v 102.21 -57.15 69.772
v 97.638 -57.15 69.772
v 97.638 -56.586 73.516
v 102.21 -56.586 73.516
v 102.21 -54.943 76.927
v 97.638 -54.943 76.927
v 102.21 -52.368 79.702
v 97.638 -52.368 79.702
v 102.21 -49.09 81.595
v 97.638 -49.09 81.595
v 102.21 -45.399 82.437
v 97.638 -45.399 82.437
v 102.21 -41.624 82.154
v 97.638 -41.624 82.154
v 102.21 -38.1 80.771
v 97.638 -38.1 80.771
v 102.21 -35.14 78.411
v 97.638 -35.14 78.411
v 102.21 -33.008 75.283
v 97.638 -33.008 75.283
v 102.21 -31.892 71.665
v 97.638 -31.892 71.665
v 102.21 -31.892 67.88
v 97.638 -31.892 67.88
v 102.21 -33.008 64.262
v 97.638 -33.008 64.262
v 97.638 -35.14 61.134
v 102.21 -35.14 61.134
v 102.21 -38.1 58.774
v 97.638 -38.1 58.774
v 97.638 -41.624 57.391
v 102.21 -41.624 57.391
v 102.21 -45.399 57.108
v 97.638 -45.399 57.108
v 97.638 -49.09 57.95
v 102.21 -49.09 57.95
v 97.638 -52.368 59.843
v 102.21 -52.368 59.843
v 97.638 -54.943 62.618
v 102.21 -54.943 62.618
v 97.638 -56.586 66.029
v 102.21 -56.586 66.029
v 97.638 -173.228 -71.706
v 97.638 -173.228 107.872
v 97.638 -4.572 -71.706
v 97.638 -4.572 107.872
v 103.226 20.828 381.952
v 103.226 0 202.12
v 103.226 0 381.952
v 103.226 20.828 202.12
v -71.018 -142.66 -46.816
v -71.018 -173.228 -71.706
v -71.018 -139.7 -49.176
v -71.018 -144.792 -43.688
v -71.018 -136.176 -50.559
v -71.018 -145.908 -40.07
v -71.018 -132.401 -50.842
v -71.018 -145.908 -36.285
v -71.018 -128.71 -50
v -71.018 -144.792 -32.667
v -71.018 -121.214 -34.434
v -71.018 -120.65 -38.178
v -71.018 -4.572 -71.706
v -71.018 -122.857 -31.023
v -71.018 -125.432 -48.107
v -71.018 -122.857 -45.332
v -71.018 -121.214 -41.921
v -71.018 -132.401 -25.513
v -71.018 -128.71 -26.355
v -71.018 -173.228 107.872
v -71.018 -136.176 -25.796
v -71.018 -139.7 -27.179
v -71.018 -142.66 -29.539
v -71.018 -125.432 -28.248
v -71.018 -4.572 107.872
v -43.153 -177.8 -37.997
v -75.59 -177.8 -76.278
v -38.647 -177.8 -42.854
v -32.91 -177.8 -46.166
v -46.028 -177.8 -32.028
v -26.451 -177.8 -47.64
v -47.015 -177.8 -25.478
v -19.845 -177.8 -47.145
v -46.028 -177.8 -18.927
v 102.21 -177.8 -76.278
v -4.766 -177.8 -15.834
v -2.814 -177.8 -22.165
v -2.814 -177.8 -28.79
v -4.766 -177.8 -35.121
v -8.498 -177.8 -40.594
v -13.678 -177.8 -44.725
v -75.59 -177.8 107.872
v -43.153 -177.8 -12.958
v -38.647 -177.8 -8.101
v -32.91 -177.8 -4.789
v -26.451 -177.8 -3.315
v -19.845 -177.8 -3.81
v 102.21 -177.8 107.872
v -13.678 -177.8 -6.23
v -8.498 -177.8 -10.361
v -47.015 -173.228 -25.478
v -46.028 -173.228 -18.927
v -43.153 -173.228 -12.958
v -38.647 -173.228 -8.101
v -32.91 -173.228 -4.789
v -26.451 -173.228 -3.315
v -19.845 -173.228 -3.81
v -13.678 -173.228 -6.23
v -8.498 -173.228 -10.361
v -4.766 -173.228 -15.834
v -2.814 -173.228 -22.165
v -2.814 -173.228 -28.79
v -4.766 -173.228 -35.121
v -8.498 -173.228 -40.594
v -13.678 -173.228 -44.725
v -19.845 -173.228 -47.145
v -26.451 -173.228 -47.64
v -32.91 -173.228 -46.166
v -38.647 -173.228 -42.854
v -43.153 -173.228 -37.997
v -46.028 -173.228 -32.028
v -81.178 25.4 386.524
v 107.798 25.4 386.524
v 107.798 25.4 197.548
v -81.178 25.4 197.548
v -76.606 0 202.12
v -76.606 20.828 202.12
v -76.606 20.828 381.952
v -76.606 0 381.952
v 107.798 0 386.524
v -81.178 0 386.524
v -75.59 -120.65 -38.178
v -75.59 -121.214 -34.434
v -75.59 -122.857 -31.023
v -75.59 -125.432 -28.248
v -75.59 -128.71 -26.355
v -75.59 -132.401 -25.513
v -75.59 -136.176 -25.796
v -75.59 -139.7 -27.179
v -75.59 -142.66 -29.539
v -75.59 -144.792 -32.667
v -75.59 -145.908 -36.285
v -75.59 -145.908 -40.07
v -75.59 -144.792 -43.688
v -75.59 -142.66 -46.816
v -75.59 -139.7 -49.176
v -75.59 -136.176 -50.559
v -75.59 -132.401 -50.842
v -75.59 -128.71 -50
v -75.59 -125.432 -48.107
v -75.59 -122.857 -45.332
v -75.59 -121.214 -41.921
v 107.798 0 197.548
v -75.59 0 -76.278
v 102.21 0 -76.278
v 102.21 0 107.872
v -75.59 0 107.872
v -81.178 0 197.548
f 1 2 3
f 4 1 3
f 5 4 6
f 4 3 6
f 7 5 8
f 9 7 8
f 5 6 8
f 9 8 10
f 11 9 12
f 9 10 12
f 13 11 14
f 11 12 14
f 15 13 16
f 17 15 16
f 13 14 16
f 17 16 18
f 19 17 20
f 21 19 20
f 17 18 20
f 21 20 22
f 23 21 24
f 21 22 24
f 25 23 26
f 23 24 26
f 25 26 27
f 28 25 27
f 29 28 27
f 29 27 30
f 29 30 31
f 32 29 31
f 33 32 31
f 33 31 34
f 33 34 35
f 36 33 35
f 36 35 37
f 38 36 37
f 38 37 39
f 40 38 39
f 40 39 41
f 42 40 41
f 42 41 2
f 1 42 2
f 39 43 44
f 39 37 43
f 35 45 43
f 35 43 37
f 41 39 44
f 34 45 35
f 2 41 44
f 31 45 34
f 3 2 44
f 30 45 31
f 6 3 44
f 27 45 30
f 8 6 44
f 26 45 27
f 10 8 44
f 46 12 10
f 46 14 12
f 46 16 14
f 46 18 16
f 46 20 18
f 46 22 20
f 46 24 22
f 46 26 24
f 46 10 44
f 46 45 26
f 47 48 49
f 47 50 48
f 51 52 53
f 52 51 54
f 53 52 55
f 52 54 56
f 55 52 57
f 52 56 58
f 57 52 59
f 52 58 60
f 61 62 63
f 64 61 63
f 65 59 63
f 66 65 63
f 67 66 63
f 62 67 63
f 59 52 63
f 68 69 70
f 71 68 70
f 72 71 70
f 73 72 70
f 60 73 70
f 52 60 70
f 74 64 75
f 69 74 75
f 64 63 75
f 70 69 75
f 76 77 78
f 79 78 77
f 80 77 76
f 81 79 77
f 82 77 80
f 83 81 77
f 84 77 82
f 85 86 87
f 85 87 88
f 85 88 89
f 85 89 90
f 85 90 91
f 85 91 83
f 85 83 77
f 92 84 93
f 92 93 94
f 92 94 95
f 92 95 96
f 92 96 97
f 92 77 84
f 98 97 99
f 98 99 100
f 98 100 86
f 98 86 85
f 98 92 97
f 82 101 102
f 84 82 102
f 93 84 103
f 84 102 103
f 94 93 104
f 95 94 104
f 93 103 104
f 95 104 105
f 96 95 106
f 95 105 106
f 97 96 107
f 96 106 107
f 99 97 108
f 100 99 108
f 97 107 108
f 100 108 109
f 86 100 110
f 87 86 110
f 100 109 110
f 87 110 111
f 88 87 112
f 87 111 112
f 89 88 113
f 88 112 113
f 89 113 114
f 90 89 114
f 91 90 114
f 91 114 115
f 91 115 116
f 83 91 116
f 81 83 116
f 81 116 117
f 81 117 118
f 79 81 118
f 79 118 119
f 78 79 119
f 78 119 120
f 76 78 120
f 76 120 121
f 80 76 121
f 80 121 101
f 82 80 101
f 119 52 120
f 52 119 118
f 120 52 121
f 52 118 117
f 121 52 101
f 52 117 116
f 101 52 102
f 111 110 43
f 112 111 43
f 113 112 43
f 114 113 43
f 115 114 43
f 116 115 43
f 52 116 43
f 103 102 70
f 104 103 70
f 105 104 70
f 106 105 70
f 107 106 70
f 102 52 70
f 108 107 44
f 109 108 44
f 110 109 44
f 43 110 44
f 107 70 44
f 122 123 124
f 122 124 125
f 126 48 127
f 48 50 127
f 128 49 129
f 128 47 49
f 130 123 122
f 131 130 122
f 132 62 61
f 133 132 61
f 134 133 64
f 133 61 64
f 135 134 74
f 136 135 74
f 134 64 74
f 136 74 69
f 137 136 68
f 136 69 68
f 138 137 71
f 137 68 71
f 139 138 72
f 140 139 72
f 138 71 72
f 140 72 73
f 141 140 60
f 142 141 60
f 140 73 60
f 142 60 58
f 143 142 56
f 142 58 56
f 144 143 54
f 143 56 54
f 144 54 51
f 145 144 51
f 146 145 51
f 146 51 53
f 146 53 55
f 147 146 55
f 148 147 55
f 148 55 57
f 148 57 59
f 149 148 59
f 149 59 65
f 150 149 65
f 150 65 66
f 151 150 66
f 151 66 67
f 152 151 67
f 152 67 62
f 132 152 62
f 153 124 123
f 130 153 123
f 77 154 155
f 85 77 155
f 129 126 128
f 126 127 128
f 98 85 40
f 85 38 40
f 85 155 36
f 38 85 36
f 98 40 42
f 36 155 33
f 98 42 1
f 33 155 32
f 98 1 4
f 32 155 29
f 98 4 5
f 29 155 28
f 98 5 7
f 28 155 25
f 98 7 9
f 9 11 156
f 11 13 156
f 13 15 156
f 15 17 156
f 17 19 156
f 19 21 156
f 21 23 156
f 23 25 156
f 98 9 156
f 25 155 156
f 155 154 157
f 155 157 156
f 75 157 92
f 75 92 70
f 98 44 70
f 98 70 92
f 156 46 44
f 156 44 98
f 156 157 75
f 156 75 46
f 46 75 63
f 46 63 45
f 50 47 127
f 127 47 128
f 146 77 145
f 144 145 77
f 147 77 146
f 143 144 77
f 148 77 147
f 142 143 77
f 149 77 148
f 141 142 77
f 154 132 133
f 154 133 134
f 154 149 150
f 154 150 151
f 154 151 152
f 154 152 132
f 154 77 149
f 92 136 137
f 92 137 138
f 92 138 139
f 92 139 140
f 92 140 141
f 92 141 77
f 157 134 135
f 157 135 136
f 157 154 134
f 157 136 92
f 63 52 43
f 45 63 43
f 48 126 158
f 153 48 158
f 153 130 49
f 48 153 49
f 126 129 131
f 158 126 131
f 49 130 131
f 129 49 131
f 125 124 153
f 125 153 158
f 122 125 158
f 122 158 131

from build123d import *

# Parameters (mm, degrees)
F0_W      = 177.8
F0_H      = 184.15
F1_DEPTH  = 177.8
F2_T      = -4.572
F4_D      = 44.45
F4_DEPTH  = 12.7
F4_TIP    = 13.3541272579
F6_D      = 25.4
F6_DEPTH  = 12.7
F6_TIP    = 7.6309298617
F8_W      = 188.976
F8_H      = 188.976
F9_DEPTH  = 25.4
F10_T     = -4.572
F12_D     = 25.4
F12_DEPTH = 12.7
F12_TIP   = 7.6309298617


with BuildPart() as f1:
    # F0 (on Front) → F1 (new body)
    with BuildSketch(Plane.XZ):
        with Locations((13.3096763432, 15.7974687822)):
            Rectangle(F0_W, F0_H)
    extrude(amount=F1_DEPTH)

    # F2
    f2_openings = [f1.faces().sort_by_distance(p)[0] for p in [
        (13.309676, -88.9, 107.872469),
    ]]
    offset(amount=F2_T, openings=f2_openings)

    # F4
    with Locations(Plane.XZ.offset(177.8)):
        with Locations((-24.7903236568, -25.4775312178)):
            Hole(F4_D / 2, depth=F4_DEPTH)
            with Locations((0, 0, -(F4_DEPTH + F4_TIP / 2))):  # 118° drill point
                Cone(0, F4_D / 2, F4_TIP, mode=Mode.SUBTRACT)

    # F6
    with Locations(Plane.YZ.offset(102.2096763432)):
        with Locations((-44.45, 69.7724687822)):
            Hole(F6_D / 2, depth=F6_DEPTH)
            with Locations((0, 0, -(F6_DEPTH + F6_TIP / 2))):  # 118° drill point
                Cone(0, F6_D / 2, F6_TIP, mode=Mode.SUBTRACT)

    # F12
    with Locations(Plane(origin=(-75.5903236568, 0, 0), x_dir=(0, -1, 0), z_dir=(-1, 0, 0))):
        with Locations((133.35, -38.1775312178)):
            Hole(F12_D / 2, depth=F12_DEPTH)
            with Locations((0, 0, -(F12_DEPTH + F12_TIP / 2))):  # 118° drill point
                Cone(0, F12_D / 2, F12_TIP, mode=Mode.SUBTRACT)


with BuildPart() as f9:
    # F8 (on offset) → F9 (new body)
    with BuildSketch(Plane(origin=(0, 25.4, 0), x_dir=(-1, 0, 0), z_dir=(0, 1, 0))):
        with Locations((-13.3096763432, 292.035728693)):
            Rectangle(F8_W, F8_H)
    extrude(amount=-F9_DEPTH)

    # F10
    f10_openings = [f9.faces().sort_by_distance(p)[0] for p in [
        (13.309676, 0, 292.035729),
    ]]
    offset(amount=F10_T, openings=f10_openings)


solid = Compound([f1.part, f9.part])
